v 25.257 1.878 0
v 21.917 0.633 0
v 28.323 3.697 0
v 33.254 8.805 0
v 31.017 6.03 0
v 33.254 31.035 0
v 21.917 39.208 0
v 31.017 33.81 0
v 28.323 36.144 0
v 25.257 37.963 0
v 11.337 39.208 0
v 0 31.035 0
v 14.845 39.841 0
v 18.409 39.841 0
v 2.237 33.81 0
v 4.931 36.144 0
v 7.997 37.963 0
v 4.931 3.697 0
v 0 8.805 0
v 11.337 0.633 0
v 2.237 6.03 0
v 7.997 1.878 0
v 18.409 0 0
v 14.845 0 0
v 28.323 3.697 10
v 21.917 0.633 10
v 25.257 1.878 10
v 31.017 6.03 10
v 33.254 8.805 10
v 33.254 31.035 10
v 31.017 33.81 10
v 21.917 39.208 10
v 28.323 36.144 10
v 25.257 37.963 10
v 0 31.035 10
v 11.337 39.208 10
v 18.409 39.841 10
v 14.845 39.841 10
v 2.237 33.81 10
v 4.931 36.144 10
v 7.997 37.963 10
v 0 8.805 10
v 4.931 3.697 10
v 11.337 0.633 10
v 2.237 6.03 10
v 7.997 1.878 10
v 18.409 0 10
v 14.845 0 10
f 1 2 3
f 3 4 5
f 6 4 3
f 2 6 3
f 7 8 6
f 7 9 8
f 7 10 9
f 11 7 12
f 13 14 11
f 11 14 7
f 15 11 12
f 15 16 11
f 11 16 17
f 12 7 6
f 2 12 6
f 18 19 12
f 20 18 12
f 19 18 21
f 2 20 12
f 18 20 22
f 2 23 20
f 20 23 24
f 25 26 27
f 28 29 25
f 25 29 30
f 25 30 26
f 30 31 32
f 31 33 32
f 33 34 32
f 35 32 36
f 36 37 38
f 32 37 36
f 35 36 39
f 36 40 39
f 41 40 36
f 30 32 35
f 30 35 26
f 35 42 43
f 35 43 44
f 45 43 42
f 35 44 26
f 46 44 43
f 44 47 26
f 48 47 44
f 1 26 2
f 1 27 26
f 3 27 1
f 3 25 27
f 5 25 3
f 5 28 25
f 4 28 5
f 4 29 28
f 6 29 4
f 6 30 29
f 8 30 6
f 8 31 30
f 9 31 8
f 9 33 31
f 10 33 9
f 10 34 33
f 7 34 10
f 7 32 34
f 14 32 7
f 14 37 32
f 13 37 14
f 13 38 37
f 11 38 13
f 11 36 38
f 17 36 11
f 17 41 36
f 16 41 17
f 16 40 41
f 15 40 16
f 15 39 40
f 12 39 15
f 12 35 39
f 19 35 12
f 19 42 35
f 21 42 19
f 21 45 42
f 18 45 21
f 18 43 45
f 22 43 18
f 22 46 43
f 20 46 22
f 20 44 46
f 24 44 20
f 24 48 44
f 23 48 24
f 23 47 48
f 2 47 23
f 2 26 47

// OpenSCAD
$fn = 32;

// ----------------------------------------------------------------------
// Flat adaptor: double_d, 10 mm thick
// ----------------------------------------------------------------------

// --- parameters (mm) ---
profile_height = 10;      // extrusion height
profile_points = 24;      // points of the closed outline

profile = [[33.254, 31.035], [31.017, 33.81], [28.323, 36.144], [25.257, 37.963], [21.917, 39.208], [18.409, 39.841], [14.845, 39.841], [11.337, 39.208], [7.997, 37.963], [4.931, 36.144], [2.237, 33.81], [0, 31.035], [0, 8.805], [2.237, 6.03], [4.931, 3.697], [7.997, 1.878], [11.337, 0.633], [14.845, 0], [18.409, 0], [21.917, 0.633], [25.257, 1.878], [28.323, 3.697], [31.017, 6.03], [33.254, 8.805]];  // single closed polygon, 24 points, counter clockwise

// --- the one profile operation ---
linear_extrude(height = profile_height) polygon(points = profile);
